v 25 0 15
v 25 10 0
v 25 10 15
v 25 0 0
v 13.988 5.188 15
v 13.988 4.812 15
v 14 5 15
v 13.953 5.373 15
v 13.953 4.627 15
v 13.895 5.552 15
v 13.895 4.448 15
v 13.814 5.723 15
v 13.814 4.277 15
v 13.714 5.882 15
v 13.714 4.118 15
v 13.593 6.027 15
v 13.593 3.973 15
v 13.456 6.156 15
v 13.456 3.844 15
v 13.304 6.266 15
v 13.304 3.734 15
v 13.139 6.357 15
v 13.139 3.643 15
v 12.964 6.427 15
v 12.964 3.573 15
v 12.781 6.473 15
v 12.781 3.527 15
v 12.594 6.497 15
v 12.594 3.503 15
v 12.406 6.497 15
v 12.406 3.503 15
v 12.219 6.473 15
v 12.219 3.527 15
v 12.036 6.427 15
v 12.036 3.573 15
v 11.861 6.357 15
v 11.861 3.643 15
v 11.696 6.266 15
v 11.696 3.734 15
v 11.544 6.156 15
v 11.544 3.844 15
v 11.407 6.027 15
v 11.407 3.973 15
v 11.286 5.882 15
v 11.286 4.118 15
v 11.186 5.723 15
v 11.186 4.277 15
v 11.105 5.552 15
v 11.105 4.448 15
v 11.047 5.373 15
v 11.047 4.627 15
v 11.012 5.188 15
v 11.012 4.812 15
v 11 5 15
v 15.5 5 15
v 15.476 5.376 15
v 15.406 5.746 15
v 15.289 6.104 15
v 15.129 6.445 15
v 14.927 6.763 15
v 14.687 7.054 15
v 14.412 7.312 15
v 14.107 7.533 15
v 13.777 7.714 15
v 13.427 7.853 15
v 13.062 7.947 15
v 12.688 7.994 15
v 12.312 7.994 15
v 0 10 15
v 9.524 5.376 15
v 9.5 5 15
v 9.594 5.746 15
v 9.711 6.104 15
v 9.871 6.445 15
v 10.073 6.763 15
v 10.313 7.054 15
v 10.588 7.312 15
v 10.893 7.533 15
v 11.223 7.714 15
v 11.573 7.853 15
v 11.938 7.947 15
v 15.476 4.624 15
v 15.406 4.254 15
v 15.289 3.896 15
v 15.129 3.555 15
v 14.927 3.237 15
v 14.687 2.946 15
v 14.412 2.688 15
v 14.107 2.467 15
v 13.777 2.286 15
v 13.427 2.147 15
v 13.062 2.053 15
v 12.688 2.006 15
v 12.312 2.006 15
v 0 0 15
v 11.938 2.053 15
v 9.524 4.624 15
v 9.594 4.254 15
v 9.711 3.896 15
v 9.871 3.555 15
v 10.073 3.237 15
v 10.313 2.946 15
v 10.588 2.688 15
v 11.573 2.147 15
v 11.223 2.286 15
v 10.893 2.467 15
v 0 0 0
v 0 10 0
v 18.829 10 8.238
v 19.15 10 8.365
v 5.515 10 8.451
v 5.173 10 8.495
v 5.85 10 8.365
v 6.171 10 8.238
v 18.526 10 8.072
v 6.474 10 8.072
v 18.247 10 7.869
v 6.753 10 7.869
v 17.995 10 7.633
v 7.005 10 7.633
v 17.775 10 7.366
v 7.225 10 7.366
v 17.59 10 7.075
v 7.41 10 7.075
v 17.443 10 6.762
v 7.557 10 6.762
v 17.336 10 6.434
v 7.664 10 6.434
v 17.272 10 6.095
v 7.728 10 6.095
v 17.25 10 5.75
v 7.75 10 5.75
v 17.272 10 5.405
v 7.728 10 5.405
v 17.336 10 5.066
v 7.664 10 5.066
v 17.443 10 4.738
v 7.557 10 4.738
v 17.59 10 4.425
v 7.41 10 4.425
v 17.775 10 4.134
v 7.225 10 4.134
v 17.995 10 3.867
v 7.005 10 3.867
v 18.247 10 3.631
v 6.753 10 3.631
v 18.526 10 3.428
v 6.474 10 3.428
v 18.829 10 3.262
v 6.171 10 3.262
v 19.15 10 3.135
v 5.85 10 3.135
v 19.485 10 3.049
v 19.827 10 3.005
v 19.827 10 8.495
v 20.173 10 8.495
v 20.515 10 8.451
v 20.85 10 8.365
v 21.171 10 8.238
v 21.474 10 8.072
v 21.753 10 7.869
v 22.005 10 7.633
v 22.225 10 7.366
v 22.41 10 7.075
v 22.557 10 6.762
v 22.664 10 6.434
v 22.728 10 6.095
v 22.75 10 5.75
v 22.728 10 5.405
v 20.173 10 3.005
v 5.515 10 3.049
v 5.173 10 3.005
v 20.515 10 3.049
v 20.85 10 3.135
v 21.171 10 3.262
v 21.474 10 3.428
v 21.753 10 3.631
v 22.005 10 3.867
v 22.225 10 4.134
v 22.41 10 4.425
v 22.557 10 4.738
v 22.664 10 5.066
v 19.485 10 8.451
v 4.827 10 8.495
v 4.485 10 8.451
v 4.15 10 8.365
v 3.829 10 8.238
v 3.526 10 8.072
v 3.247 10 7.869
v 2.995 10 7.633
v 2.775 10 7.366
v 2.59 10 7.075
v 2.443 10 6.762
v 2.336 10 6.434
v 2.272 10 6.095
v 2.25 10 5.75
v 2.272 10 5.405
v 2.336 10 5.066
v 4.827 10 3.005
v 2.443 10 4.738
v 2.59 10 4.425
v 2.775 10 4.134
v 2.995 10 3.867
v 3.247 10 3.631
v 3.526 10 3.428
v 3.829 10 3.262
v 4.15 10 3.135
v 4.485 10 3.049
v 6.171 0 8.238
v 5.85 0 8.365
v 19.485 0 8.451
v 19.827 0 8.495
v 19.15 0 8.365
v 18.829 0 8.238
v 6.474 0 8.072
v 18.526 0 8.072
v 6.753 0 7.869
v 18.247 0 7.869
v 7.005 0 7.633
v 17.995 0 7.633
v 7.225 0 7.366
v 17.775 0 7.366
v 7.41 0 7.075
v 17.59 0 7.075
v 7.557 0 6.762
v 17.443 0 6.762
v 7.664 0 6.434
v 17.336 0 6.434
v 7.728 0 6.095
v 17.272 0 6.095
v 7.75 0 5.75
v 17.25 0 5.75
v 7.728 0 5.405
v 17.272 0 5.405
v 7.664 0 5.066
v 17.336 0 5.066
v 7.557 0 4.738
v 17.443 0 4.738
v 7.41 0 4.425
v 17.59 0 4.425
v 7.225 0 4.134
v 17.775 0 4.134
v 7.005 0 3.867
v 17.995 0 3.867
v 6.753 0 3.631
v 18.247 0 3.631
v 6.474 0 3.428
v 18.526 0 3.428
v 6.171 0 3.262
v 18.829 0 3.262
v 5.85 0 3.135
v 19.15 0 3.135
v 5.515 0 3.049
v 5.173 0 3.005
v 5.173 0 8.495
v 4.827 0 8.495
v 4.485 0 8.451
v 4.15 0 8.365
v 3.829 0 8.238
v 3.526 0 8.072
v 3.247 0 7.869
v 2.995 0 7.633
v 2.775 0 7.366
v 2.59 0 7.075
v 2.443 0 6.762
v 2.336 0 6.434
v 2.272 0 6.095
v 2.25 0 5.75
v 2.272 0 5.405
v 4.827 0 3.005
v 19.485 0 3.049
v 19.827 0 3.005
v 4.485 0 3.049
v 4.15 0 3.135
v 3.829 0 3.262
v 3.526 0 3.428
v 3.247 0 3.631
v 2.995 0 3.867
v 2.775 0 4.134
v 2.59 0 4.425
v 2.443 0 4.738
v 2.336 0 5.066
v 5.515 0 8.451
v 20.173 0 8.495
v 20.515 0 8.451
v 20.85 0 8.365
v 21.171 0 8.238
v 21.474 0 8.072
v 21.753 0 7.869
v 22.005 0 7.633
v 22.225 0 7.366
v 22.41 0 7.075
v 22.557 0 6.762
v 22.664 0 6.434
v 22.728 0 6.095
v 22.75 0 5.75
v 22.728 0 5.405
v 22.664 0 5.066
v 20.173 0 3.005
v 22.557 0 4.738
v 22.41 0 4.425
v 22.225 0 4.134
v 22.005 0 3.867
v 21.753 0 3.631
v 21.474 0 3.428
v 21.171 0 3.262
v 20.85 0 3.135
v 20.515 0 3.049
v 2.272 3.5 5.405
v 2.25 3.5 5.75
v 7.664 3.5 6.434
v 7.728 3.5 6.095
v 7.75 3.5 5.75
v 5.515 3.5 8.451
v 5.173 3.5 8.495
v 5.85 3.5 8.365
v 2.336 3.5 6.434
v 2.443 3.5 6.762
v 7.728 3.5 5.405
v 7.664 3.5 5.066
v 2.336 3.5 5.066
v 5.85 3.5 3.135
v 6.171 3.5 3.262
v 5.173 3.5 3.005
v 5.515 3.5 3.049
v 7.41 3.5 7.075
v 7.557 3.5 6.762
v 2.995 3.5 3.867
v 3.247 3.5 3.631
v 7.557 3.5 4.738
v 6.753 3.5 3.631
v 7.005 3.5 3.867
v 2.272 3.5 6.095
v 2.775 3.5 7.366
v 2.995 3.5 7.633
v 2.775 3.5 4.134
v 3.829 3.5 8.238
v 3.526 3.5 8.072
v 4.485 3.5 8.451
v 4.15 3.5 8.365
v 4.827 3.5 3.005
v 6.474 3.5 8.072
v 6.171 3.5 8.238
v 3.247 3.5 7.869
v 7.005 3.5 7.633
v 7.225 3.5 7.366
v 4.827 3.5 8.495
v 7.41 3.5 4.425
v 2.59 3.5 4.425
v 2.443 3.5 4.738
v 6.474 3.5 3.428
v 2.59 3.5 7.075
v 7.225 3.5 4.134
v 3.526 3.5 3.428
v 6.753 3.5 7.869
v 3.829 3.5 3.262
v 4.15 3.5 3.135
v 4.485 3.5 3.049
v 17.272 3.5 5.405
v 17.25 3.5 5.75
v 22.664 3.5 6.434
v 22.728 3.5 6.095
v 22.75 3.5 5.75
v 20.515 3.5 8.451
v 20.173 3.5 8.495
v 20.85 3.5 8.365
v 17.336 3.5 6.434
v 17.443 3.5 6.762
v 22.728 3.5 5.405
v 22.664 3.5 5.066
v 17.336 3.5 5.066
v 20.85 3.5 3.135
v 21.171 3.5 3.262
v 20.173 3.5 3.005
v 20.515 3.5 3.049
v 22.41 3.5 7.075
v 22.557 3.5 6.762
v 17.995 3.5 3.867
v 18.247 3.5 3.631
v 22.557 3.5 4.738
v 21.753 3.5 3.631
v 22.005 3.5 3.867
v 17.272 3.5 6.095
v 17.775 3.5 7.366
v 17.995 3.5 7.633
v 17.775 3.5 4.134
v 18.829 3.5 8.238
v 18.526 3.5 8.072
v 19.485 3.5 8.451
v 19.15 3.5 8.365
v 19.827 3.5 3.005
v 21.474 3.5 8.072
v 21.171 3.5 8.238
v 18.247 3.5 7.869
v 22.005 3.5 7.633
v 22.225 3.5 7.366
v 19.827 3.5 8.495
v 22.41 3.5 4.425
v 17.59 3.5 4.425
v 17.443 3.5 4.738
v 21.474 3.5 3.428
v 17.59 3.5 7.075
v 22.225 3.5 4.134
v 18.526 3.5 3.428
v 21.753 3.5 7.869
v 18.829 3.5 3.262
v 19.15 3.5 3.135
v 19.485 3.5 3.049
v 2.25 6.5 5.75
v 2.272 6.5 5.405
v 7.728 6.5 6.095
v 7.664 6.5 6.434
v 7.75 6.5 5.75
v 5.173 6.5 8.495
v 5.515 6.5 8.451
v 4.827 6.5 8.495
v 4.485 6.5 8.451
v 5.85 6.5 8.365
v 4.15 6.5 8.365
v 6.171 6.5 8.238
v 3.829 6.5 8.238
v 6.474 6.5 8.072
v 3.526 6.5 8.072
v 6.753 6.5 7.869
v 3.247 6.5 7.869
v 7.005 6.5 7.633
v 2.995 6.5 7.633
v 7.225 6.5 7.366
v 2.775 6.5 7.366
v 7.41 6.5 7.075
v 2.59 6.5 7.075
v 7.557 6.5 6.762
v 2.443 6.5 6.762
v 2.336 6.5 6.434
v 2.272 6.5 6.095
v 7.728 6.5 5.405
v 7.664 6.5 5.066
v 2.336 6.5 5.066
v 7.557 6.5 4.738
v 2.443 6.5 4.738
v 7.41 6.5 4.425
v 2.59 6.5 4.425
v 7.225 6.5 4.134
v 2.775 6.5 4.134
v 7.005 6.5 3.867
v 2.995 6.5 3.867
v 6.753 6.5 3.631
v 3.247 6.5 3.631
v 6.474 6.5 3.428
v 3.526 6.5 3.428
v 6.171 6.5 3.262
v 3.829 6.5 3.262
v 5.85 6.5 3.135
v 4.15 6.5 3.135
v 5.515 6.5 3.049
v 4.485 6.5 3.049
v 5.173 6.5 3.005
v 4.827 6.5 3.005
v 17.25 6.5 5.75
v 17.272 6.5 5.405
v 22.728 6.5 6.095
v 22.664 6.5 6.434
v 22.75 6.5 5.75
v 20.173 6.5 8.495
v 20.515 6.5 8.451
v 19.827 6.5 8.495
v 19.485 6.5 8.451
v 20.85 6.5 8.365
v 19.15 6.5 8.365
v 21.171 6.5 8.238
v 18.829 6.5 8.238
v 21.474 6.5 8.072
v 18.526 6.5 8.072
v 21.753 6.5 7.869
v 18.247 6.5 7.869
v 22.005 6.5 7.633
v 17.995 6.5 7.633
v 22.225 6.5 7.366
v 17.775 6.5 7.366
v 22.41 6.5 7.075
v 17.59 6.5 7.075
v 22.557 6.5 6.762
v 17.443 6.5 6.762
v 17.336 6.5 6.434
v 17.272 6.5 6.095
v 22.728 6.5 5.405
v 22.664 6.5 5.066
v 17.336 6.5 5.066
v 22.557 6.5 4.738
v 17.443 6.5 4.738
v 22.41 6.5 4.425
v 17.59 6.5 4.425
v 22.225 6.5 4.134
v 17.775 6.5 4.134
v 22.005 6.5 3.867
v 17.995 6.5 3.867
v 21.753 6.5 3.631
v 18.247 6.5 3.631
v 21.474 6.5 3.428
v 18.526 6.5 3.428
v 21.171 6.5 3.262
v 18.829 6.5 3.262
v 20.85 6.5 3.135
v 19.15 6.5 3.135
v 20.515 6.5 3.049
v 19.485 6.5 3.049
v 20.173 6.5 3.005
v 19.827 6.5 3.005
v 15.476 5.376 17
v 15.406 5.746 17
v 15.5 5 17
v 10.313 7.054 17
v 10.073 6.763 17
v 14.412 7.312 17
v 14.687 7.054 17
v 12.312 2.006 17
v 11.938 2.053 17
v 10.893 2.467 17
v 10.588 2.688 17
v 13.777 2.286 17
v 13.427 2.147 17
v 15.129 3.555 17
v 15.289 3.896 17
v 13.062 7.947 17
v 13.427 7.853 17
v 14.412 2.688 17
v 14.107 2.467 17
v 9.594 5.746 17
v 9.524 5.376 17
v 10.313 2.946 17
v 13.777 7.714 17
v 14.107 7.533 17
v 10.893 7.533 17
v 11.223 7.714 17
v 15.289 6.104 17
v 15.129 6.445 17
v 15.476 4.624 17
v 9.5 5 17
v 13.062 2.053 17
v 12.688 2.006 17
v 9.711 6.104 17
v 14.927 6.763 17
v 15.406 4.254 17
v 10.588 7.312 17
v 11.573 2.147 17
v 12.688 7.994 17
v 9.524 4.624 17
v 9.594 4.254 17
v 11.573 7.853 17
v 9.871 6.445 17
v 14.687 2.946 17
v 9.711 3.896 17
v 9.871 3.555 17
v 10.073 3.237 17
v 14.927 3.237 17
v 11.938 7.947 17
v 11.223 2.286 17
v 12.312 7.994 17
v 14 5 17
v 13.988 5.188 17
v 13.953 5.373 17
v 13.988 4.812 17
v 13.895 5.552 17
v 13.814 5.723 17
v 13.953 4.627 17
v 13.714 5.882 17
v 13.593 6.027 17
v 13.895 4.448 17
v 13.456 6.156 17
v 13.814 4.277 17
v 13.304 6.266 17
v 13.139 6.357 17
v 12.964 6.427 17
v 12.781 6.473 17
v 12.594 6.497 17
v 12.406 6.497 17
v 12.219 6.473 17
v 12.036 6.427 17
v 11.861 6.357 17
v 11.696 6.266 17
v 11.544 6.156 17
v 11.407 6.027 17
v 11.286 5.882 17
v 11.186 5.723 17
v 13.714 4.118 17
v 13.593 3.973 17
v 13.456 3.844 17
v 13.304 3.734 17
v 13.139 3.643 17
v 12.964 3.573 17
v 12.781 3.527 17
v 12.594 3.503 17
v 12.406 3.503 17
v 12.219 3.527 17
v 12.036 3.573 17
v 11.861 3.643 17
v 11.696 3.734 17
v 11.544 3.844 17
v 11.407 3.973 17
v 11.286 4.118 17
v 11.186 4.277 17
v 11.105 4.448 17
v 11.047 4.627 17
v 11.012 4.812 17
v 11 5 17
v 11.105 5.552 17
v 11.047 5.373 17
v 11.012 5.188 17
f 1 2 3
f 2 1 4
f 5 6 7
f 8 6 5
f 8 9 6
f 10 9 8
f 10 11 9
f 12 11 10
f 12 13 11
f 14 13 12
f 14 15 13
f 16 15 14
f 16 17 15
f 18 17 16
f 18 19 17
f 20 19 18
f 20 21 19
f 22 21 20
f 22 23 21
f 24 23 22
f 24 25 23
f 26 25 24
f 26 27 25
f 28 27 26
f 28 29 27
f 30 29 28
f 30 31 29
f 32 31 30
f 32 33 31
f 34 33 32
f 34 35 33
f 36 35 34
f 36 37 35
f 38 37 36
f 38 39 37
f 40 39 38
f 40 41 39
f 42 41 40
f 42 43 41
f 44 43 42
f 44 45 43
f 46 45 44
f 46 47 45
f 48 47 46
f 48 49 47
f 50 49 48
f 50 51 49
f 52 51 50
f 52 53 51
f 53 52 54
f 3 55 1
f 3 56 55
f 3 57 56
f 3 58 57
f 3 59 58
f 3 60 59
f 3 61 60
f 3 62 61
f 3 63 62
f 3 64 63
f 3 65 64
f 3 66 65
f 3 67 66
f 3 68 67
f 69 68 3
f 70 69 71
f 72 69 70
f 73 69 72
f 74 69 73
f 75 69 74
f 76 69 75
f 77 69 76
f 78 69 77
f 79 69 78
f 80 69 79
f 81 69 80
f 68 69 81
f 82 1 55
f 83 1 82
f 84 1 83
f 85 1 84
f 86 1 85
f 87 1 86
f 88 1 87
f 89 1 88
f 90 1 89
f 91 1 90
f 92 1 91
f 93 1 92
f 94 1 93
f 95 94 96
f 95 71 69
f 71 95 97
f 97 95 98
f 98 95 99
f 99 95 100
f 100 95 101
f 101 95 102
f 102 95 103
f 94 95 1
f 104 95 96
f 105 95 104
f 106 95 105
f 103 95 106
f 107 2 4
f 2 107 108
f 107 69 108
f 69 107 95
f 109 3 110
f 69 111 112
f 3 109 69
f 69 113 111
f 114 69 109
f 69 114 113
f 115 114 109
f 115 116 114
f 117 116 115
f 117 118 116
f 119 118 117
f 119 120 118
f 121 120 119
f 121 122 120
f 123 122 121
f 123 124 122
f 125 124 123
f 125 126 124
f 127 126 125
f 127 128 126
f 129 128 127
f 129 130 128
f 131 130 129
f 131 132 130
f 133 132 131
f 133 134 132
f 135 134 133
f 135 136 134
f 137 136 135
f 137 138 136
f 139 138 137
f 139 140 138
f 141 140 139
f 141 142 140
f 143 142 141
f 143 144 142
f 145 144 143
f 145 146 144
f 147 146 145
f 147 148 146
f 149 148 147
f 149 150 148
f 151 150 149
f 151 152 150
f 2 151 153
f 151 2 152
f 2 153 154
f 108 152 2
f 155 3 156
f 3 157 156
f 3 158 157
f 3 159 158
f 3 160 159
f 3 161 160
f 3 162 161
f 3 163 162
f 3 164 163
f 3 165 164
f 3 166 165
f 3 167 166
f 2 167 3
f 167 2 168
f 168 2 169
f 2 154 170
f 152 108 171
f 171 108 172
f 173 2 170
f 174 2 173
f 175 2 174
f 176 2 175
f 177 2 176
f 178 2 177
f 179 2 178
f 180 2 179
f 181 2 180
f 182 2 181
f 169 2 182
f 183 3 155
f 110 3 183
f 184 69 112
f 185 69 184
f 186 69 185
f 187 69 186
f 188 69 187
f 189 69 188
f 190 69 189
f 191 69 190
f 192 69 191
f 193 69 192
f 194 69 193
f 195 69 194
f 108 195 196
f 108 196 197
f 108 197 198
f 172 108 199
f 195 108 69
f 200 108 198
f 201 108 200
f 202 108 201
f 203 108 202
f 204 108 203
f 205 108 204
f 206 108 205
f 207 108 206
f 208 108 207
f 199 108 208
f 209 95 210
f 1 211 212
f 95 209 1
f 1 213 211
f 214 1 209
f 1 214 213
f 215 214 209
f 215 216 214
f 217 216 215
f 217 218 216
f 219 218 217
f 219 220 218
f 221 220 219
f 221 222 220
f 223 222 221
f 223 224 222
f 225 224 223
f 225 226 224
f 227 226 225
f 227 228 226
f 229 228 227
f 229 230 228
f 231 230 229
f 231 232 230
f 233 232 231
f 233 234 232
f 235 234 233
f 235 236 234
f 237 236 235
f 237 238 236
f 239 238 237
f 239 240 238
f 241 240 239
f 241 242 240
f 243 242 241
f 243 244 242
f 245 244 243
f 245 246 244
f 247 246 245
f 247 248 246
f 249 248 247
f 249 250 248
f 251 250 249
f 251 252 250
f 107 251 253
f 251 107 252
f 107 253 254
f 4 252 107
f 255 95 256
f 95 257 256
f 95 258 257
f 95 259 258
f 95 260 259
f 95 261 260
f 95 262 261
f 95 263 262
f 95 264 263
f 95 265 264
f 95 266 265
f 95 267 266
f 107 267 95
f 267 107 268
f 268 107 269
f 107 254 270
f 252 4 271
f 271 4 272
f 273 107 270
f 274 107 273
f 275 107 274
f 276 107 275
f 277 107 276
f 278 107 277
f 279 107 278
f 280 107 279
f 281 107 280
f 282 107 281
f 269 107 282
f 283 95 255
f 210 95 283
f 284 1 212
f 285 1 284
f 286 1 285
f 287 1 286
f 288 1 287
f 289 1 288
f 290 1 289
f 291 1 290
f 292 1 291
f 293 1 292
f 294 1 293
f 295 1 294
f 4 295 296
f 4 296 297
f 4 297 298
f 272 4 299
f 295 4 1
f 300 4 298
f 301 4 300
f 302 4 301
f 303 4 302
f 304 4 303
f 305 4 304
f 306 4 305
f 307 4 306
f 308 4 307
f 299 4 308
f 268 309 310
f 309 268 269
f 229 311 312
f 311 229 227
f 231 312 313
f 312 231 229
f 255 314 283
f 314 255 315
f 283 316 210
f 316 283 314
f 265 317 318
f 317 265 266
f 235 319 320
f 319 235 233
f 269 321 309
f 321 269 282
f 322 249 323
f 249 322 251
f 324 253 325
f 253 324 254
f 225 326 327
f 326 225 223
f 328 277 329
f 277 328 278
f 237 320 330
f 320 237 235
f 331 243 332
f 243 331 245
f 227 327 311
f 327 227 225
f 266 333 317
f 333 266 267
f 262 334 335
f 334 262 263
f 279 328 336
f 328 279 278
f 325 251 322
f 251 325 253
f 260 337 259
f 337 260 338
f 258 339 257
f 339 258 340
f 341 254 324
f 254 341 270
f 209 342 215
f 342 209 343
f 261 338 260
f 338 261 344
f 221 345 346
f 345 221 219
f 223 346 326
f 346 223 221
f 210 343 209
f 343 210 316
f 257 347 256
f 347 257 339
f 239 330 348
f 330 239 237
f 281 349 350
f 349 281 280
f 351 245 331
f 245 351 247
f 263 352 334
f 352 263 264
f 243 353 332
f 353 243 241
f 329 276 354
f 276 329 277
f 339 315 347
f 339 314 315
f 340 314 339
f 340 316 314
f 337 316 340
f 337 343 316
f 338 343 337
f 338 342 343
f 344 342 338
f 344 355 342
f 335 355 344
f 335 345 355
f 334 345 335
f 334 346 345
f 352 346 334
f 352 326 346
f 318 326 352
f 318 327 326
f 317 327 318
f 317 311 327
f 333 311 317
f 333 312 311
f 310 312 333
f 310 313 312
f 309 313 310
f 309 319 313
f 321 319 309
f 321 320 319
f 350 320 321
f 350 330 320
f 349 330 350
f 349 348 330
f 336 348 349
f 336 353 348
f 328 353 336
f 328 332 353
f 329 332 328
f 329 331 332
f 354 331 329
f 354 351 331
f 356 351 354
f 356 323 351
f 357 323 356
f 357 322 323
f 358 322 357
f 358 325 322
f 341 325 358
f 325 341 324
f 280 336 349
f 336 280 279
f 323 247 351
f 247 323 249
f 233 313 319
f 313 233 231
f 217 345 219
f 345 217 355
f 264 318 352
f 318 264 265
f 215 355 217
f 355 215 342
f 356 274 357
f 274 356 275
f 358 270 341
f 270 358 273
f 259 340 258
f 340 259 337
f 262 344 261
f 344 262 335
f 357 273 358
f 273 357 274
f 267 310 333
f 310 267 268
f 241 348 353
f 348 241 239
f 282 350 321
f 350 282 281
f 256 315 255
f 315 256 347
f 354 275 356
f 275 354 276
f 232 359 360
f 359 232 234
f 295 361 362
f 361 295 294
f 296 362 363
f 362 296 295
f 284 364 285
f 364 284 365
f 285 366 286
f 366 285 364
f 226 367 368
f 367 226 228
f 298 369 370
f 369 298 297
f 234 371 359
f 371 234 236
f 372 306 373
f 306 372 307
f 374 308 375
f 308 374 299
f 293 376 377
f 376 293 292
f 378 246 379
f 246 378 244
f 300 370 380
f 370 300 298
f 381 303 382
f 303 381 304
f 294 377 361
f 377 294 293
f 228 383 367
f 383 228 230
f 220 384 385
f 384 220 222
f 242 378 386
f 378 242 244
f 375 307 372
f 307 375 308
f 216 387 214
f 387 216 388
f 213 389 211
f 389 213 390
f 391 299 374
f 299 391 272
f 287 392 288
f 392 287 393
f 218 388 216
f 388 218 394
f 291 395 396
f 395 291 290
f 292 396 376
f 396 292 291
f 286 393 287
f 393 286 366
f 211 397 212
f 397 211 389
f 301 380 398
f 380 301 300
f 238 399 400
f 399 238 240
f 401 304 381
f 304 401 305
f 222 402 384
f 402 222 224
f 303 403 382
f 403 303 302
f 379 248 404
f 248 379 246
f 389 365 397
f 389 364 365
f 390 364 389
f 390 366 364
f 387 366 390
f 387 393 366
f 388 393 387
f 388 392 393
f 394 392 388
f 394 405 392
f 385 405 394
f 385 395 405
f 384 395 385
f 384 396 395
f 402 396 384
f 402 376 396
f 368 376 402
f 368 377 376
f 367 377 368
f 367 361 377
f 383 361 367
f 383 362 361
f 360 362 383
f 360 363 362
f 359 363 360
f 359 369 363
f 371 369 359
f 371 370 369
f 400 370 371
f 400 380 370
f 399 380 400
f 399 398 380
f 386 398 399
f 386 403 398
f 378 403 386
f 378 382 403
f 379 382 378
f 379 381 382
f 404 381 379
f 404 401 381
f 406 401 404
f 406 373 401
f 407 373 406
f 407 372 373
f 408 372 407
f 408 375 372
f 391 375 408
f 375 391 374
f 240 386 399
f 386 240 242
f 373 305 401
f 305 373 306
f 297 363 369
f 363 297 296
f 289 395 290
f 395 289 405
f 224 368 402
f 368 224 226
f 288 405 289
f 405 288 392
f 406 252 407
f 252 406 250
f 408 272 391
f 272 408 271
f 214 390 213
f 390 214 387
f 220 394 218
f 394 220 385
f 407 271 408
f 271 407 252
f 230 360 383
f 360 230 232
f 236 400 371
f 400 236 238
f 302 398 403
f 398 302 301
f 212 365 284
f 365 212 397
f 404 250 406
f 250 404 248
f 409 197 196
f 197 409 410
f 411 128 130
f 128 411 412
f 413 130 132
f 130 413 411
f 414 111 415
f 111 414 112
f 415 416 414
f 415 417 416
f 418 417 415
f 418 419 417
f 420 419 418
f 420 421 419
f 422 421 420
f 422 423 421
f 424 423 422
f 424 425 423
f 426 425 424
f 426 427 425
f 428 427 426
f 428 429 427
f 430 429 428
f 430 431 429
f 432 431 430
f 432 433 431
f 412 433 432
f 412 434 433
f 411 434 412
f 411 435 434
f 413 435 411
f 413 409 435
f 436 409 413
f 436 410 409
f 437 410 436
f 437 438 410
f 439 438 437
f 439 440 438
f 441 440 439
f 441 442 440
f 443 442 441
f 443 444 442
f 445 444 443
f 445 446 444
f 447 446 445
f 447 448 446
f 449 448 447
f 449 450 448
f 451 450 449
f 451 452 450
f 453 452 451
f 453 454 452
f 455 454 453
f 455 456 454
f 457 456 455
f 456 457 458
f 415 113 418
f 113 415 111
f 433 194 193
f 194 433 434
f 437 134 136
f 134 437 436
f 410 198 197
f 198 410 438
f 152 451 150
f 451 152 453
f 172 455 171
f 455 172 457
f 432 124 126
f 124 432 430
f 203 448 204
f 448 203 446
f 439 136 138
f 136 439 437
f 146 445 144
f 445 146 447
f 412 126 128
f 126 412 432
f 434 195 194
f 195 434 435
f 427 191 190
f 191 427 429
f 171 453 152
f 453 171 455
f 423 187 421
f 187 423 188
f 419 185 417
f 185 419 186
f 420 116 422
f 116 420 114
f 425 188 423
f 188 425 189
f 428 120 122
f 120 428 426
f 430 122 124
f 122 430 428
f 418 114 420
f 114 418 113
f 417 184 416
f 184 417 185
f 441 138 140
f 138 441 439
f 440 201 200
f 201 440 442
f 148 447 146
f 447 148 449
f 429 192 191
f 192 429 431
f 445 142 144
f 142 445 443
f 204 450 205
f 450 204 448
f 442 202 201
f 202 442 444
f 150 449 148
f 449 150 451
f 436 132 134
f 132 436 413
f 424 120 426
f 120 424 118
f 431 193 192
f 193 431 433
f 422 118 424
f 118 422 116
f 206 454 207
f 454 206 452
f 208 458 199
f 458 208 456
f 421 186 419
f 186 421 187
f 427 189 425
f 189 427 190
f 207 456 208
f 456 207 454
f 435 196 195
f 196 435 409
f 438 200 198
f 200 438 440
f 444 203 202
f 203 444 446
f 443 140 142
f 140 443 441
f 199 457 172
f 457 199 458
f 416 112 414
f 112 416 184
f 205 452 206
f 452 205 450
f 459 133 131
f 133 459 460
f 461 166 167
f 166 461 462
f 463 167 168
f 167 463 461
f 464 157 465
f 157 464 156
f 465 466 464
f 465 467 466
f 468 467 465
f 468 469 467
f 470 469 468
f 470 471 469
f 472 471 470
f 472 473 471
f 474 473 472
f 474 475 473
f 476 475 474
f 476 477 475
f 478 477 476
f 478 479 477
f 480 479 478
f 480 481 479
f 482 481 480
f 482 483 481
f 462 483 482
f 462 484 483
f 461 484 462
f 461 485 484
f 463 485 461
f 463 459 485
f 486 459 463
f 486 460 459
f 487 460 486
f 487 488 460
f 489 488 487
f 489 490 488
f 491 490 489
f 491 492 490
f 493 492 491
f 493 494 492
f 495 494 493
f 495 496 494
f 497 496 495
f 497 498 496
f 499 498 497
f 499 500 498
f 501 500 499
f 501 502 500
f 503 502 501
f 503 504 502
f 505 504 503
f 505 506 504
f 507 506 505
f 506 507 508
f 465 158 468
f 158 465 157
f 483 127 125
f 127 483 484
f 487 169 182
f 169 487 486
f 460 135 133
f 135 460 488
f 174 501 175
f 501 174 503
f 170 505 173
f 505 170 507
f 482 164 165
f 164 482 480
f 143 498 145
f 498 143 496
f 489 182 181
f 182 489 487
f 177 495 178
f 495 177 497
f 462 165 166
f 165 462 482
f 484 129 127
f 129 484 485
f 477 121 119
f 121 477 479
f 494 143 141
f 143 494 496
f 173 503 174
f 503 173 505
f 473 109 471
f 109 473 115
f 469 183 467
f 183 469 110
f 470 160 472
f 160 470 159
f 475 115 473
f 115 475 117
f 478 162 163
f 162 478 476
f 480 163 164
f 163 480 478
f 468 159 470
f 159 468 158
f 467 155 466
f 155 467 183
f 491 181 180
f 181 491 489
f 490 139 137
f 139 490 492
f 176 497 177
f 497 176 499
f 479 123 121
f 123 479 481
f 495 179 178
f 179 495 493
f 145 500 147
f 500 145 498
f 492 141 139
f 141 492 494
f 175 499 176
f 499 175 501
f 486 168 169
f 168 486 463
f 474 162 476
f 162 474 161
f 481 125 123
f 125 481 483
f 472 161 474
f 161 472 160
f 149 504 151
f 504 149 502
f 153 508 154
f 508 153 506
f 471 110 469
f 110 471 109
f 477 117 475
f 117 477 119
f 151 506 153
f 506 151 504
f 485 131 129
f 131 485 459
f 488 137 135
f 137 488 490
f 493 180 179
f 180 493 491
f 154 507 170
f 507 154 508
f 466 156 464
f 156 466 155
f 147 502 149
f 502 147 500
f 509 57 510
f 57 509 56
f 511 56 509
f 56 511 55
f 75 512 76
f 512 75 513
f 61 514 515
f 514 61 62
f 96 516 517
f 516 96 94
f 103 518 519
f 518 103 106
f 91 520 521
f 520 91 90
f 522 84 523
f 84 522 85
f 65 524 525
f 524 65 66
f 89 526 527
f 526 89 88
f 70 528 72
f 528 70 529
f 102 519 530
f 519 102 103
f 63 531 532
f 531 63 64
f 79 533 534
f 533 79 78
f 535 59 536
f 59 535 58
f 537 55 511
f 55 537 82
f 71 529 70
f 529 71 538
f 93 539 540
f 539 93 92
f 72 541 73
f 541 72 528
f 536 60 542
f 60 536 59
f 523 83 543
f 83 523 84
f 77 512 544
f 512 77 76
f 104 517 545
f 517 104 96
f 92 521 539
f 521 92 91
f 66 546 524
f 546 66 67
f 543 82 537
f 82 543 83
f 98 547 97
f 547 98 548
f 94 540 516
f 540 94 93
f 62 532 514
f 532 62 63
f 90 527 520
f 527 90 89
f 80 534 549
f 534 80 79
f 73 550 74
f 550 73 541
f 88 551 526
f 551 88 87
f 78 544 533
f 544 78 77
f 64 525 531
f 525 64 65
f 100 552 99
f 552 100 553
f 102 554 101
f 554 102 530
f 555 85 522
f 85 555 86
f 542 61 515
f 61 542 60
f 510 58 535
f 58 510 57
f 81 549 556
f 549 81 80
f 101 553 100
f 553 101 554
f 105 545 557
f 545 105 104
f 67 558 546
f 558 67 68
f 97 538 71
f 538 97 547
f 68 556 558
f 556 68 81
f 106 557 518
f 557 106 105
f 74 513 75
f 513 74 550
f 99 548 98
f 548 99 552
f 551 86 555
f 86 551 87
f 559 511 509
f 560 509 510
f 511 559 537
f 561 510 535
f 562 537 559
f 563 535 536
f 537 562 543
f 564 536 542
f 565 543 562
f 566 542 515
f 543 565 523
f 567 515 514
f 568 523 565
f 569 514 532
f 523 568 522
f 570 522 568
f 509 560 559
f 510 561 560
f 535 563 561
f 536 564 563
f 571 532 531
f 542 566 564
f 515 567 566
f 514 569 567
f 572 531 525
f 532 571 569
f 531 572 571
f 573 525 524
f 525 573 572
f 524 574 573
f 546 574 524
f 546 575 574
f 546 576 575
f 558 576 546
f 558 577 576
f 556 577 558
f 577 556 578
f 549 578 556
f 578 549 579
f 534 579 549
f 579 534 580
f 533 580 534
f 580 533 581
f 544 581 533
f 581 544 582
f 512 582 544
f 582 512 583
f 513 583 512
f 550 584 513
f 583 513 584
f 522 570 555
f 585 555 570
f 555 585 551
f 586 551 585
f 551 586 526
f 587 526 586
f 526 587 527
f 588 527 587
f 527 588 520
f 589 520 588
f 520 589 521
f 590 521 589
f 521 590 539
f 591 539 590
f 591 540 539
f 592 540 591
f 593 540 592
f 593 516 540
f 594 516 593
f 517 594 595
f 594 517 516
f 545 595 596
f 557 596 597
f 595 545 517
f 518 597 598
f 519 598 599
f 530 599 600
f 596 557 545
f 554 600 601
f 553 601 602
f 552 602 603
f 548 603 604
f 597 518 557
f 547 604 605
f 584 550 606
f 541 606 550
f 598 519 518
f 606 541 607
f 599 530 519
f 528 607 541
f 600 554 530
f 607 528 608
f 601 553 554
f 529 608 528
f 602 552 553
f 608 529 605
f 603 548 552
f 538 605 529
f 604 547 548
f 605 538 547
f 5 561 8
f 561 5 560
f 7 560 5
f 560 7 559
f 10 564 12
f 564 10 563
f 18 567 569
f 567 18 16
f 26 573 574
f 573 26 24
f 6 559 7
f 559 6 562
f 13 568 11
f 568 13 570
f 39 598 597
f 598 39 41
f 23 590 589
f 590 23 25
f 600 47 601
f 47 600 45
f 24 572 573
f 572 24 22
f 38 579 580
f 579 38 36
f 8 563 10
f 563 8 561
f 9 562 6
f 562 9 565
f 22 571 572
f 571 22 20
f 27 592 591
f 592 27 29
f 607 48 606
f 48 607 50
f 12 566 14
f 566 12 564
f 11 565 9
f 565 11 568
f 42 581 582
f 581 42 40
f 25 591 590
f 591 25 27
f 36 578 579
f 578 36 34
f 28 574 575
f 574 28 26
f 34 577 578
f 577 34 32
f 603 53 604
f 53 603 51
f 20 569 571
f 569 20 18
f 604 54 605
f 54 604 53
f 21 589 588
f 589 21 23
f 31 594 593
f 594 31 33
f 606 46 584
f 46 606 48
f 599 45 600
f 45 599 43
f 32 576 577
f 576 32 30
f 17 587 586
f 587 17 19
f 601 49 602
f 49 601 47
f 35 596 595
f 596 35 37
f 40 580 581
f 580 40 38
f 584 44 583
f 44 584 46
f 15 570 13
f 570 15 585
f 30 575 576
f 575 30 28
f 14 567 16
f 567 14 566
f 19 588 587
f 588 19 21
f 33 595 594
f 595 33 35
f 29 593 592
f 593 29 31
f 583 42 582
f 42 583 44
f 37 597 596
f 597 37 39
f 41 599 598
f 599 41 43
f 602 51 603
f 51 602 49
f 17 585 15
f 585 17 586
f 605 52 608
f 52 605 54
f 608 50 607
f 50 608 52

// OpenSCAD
// Copyright 2024 Martin Scheidt (Attribution 4.0 International, CC-BY 4.0)
//
// You are free to copy and redistribute the material in any medium or format.
// You are free to remix, transform, and build upon the material for any purpose, even commercially.
// You must give appropriate credit, provide a link to the license, and indicate if changes were made.
// You may not apply legal terms or technological measures that legally restrict others from doing anything the license permits.
// No warranties are given.

include<./specification_of_components.scad>

$fn = 50;

module magnet_hole(){
    cylinder(h=magnet_thickness+move_tolerance, d=magnet_diameter+move_tolerance);
}
module route_clearing_point(){
    union(){
        difference(){
            cylinder(h=engraving_height, d=cp_symbol_size);
            cylinder(h=engraving_height, d=cp_symbol_size-2*engraving_thickness);
        }   
    }
}

module block_clearing_point(){
    translate([0,0,engraving_height/2]) union(){    
        difference(){
            cube([cp_symbol_size,cp_symbol_size,engraving_height], center=true);
            cube([cp_symbol_size-2*engraving_thickness,cp_symbol_size-2*engraving_thickness,engraving_height], center=true);
        }
    }
}



module clearing_point(type){
    difference(){
        cube([zs_with,zs_depth,zs_height]);
        //Magnet holes
        translate([zs_with/2-magnet_distance_to_middle,magnet_thickness+move_tolerance,magnet_z]) rotate([90,0,0]) magnet_hole();
        translate([zs_with/2+magnet_distance_to_middle,magnet_thickness+move_tolerance,magnet_z]) rotate([90,0,0]) magnet_hole();
        translate([zs_with/2-magnet_distance_to_middle,zs_depth,magnet_z]) rotate([90,0,0]) magnet_hole();
        translate([zs_with/2+magnet_distance_to_middle,zs_depth,magnet_z]) rotate([90,0,0]) magnet_hole();
    }
    //symbols
    if(type == "rcp"){
            translate([zs_with/2,zs_depth/2,zs_height]) route_clearing_point();
    }
    if(type == "bcp"){
            translate([zs_with/2,zs_depth/2,zs_height]) block_clearing_point();
    }
}

clearing_point("rcp");
//route_clearing_point();
//block_clearing_point();
